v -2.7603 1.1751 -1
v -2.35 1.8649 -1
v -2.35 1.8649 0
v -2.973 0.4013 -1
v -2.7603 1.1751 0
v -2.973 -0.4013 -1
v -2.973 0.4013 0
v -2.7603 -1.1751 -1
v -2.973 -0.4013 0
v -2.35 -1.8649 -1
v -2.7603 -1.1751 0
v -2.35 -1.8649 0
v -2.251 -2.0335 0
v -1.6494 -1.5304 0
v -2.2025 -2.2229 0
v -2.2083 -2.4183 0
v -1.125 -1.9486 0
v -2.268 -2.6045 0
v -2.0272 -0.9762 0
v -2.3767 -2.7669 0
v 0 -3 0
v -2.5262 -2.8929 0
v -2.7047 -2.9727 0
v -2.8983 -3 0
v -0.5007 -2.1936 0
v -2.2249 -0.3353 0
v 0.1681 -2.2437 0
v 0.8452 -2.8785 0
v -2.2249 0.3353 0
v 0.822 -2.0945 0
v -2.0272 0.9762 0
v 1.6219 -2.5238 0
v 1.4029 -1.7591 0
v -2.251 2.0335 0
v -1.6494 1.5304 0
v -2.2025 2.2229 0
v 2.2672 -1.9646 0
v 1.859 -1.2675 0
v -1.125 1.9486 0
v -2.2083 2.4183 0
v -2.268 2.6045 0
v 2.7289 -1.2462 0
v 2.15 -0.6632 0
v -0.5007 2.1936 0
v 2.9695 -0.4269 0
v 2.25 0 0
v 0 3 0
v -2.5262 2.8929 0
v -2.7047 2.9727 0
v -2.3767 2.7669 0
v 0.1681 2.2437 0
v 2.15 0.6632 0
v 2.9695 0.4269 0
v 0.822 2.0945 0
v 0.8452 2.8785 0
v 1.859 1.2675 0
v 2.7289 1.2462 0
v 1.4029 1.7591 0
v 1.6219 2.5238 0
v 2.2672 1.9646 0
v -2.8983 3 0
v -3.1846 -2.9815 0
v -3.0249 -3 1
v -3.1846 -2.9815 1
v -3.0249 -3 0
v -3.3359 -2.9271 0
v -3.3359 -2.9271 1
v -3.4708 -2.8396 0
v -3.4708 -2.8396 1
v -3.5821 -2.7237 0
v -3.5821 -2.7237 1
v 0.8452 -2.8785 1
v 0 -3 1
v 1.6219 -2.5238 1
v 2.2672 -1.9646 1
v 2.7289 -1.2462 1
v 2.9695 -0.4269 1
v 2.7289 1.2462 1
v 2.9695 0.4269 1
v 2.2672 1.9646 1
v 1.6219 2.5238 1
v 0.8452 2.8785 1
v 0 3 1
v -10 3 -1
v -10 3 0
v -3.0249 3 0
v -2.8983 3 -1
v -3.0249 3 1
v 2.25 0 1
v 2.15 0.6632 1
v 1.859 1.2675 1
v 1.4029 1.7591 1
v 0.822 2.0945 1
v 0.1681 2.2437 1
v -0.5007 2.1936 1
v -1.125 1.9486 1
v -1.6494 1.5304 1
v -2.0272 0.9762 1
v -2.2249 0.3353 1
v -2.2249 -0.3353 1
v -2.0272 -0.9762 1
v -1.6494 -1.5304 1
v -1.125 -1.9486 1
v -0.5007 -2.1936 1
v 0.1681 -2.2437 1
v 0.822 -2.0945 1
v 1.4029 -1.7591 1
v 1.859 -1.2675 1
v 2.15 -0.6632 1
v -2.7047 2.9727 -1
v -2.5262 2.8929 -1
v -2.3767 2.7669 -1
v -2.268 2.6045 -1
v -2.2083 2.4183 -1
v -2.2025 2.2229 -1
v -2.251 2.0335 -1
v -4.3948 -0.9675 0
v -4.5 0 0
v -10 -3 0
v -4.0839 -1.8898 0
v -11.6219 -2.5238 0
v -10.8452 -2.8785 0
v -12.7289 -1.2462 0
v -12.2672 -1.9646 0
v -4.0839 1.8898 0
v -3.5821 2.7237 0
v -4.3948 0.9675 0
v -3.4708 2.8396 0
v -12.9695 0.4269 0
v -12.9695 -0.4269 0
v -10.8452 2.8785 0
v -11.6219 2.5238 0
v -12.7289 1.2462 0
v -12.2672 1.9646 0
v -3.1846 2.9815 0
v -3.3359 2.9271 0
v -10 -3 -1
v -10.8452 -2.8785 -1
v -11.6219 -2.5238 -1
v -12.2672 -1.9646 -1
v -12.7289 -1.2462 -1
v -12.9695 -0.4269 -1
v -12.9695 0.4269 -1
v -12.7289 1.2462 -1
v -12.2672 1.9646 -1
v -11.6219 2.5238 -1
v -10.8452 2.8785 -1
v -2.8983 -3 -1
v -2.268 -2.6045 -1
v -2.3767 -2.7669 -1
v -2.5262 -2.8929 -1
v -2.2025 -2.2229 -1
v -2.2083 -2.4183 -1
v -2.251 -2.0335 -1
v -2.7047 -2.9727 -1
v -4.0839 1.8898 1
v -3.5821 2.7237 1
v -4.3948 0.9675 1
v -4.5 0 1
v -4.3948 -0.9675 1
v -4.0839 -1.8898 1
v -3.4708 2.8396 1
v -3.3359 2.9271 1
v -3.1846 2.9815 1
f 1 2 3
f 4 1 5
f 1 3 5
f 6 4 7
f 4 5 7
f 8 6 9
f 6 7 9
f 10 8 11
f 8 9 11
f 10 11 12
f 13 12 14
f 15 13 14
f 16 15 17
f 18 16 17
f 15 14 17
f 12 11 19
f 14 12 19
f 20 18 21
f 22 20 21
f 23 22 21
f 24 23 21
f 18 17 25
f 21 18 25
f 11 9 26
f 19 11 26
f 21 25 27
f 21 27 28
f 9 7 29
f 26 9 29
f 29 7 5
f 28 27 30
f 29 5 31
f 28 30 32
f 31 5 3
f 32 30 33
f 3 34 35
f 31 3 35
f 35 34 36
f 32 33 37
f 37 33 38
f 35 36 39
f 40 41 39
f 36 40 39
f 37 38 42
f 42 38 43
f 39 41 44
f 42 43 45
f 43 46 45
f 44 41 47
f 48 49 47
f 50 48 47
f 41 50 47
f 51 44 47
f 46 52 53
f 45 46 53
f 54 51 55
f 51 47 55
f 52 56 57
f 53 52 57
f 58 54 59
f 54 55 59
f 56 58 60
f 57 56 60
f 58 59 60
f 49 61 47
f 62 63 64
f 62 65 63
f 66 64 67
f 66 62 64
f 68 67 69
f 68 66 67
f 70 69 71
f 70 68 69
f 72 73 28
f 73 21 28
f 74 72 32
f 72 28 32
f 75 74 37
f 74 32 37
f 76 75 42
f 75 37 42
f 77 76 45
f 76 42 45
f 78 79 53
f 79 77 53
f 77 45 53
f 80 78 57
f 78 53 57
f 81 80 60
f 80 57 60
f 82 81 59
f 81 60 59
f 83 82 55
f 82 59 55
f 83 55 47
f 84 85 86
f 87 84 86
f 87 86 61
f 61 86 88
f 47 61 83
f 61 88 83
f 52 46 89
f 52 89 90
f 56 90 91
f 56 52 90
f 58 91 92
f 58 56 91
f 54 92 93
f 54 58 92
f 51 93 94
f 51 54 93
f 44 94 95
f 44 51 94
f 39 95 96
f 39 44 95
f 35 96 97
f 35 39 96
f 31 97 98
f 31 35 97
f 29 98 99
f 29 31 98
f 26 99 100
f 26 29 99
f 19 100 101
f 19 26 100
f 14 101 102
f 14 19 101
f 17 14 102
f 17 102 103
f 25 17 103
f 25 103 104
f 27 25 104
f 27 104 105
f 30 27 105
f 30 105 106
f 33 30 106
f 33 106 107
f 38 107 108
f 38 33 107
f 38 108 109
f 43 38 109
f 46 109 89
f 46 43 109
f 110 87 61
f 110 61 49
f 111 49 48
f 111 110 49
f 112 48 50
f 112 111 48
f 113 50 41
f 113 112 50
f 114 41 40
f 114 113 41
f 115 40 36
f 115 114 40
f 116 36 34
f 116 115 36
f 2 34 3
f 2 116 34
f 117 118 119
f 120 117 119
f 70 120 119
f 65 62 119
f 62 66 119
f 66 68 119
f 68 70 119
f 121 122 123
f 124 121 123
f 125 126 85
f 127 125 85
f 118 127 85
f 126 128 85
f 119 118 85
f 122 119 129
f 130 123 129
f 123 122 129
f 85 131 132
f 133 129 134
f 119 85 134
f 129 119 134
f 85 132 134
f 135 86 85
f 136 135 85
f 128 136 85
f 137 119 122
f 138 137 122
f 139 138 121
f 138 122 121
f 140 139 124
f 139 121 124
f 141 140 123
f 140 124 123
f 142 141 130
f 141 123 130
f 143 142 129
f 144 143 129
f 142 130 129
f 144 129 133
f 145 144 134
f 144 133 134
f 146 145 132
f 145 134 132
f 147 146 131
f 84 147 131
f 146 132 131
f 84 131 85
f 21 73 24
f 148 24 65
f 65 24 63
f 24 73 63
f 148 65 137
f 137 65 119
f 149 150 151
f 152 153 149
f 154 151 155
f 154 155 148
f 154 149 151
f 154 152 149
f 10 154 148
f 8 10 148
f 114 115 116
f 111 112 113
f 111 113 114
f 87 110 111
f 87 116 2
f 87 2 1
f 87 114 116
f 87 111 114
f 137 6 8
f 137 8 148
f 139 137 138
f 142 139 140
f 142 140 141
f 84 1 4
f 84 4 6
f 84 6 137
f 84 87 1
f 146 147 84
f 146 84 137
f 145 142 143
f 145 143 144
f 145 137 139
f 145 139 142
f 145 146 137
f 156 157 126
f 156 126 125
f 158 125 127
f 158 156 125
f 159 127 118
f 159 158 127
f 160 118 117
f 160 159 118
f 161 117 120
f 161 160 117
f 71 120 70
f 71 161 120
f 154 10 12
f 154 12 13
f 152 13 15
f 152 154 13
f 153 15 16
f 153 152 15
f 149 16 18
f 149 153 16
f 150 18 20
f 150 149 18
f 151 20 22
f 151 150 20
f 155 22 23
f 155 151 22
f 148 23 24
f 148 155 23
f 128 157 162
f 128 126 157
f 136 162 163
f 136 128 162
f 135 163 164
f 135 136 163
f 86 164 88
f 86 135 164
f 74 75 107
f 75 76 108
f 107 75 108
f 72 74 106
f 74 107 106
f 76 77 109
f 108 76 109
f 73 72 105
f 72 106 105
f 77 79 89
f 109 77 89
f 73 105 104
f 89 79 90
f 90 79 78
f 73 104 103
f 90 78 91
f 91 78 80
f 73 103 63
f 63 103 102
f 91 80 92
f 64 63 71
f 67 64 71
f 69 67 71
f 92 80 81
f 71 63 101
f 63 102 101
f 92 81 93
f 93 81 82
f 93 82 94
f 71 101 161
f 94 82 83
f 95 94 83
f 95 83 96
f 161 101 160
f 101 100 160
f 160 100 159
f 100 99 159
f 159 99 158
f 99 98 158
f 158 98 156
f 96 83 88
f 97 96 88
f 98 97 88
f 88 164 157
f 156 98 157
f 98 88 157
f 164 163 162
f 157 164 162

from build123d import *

# Parameters (mm, degrees)
SKETCH_1_R           = 3
SKETCH_1_R_2         = 2.25
EXTRUDE_1_DEPTH      = 1
EXTRUDE_2_DEPTH      = 1
EXTRUDE_2_DEPTH_BACK = 1
CUT_EXTRUDE_1_DEPTH  = 1
FILLET_START         = -2
FILLET_1_DEPTH       = 2
FILLET_2_R           = 0.7


with BuildPart() as part:
    # 草图1 → 凸台-拉伸1 (new body)
    with BuildSketch(Plane.XY):
        Circle(SKETCH_1_R)
        Circle(SKETCH_1_R_2, mode=Mode.SUBTRACT)
    extrude(amount=EXTRUDE_1_DEPTH)

    # 草图2 → 凸台-拉伸2 (add, two sides: drawn at the far end of the back side and taken through both)
    with BuildSketch(Plane(origin=(0, 0, 0), x_dir=(-1, 0, 0), z_dir=(0, 0, -1)).offset(-EXTRUDE_2_DEPTH_BACK)):
        with BuildLine():
            Line((0, -3), (10, -3))
            ThreePointArc((10, -3), (13, 0), (10, 3))
            Line((10, 3), (0, 3))
            ThreePointArc((0, 3), (3, 0), (0, -3))
        make_face()
    extrude(amount=EXTRUDE_2_DEPTH + EXTRUDE_2_DEPTH_BACK)

    # 草图3 → 切除-拉伸1 (cut)
    with BuildSketch(Plane(origin=(0, 0, 1), x_dir=(-1, 0, 0), z_dir=(0, 0, -1))):
        with BuildLine():
            Line((3.354101966, -3), (10, -3))
            ThreePointArc((10, -3), (13, 0), (10, 3))
            Line((10, 3), (3.354101966, 3))
            ThreePointArc((3.354101966, 3), (4.5, 0), (3.354101966, -3))
        make_face()
    extrude(amount=CUT_EXTRUDE_1_DEPTH, mode=Mode.SUBTRACT)

    # 圆角1: read off the stored shape, not the designer's step
    # 圆角1 outline → 圆角1 (cut)
    with BuildSketch(Plane.XY.offset(FILLET_START)):
        with BuildLine():
            ThreePointArc((0, -3), (-1.304876509, -2.701351013), (-2.349952986, -1.864864865))
            ThreePointArc((-2.349952986, -1.864864865), (-2.267960113, -2.604471185), (-2.898275349, -3))
            Line((-2.898275349, -3), (0, -3))
        make_face()
        with BuildLine():
            ThreePointArc((-2.898275349, 3), (-2.267960113, 2.604471185), (-2.349952986, 1.864864865))
            ThreePointArc((-2.349952986, 1.864864865), (-1.304876509, 2.701351013), (0, 3))
            Line((0, 3), (-2.898275349, 3))
        make_face()
    extrude(amount=FILLET_1_DEPTH, mode=Mode.SUBTRACT)

    # 圆角2
    fillet_2_edges = [part.edges().sort_by_distance(p)[0] for p in [
        (-3.354101966, 3, 0.5),
        (-3.354101966, -3, 0.5),
    ]]
    fillet(fillet_2_edges, radius=FILLET_2_R)


solid = part.part
